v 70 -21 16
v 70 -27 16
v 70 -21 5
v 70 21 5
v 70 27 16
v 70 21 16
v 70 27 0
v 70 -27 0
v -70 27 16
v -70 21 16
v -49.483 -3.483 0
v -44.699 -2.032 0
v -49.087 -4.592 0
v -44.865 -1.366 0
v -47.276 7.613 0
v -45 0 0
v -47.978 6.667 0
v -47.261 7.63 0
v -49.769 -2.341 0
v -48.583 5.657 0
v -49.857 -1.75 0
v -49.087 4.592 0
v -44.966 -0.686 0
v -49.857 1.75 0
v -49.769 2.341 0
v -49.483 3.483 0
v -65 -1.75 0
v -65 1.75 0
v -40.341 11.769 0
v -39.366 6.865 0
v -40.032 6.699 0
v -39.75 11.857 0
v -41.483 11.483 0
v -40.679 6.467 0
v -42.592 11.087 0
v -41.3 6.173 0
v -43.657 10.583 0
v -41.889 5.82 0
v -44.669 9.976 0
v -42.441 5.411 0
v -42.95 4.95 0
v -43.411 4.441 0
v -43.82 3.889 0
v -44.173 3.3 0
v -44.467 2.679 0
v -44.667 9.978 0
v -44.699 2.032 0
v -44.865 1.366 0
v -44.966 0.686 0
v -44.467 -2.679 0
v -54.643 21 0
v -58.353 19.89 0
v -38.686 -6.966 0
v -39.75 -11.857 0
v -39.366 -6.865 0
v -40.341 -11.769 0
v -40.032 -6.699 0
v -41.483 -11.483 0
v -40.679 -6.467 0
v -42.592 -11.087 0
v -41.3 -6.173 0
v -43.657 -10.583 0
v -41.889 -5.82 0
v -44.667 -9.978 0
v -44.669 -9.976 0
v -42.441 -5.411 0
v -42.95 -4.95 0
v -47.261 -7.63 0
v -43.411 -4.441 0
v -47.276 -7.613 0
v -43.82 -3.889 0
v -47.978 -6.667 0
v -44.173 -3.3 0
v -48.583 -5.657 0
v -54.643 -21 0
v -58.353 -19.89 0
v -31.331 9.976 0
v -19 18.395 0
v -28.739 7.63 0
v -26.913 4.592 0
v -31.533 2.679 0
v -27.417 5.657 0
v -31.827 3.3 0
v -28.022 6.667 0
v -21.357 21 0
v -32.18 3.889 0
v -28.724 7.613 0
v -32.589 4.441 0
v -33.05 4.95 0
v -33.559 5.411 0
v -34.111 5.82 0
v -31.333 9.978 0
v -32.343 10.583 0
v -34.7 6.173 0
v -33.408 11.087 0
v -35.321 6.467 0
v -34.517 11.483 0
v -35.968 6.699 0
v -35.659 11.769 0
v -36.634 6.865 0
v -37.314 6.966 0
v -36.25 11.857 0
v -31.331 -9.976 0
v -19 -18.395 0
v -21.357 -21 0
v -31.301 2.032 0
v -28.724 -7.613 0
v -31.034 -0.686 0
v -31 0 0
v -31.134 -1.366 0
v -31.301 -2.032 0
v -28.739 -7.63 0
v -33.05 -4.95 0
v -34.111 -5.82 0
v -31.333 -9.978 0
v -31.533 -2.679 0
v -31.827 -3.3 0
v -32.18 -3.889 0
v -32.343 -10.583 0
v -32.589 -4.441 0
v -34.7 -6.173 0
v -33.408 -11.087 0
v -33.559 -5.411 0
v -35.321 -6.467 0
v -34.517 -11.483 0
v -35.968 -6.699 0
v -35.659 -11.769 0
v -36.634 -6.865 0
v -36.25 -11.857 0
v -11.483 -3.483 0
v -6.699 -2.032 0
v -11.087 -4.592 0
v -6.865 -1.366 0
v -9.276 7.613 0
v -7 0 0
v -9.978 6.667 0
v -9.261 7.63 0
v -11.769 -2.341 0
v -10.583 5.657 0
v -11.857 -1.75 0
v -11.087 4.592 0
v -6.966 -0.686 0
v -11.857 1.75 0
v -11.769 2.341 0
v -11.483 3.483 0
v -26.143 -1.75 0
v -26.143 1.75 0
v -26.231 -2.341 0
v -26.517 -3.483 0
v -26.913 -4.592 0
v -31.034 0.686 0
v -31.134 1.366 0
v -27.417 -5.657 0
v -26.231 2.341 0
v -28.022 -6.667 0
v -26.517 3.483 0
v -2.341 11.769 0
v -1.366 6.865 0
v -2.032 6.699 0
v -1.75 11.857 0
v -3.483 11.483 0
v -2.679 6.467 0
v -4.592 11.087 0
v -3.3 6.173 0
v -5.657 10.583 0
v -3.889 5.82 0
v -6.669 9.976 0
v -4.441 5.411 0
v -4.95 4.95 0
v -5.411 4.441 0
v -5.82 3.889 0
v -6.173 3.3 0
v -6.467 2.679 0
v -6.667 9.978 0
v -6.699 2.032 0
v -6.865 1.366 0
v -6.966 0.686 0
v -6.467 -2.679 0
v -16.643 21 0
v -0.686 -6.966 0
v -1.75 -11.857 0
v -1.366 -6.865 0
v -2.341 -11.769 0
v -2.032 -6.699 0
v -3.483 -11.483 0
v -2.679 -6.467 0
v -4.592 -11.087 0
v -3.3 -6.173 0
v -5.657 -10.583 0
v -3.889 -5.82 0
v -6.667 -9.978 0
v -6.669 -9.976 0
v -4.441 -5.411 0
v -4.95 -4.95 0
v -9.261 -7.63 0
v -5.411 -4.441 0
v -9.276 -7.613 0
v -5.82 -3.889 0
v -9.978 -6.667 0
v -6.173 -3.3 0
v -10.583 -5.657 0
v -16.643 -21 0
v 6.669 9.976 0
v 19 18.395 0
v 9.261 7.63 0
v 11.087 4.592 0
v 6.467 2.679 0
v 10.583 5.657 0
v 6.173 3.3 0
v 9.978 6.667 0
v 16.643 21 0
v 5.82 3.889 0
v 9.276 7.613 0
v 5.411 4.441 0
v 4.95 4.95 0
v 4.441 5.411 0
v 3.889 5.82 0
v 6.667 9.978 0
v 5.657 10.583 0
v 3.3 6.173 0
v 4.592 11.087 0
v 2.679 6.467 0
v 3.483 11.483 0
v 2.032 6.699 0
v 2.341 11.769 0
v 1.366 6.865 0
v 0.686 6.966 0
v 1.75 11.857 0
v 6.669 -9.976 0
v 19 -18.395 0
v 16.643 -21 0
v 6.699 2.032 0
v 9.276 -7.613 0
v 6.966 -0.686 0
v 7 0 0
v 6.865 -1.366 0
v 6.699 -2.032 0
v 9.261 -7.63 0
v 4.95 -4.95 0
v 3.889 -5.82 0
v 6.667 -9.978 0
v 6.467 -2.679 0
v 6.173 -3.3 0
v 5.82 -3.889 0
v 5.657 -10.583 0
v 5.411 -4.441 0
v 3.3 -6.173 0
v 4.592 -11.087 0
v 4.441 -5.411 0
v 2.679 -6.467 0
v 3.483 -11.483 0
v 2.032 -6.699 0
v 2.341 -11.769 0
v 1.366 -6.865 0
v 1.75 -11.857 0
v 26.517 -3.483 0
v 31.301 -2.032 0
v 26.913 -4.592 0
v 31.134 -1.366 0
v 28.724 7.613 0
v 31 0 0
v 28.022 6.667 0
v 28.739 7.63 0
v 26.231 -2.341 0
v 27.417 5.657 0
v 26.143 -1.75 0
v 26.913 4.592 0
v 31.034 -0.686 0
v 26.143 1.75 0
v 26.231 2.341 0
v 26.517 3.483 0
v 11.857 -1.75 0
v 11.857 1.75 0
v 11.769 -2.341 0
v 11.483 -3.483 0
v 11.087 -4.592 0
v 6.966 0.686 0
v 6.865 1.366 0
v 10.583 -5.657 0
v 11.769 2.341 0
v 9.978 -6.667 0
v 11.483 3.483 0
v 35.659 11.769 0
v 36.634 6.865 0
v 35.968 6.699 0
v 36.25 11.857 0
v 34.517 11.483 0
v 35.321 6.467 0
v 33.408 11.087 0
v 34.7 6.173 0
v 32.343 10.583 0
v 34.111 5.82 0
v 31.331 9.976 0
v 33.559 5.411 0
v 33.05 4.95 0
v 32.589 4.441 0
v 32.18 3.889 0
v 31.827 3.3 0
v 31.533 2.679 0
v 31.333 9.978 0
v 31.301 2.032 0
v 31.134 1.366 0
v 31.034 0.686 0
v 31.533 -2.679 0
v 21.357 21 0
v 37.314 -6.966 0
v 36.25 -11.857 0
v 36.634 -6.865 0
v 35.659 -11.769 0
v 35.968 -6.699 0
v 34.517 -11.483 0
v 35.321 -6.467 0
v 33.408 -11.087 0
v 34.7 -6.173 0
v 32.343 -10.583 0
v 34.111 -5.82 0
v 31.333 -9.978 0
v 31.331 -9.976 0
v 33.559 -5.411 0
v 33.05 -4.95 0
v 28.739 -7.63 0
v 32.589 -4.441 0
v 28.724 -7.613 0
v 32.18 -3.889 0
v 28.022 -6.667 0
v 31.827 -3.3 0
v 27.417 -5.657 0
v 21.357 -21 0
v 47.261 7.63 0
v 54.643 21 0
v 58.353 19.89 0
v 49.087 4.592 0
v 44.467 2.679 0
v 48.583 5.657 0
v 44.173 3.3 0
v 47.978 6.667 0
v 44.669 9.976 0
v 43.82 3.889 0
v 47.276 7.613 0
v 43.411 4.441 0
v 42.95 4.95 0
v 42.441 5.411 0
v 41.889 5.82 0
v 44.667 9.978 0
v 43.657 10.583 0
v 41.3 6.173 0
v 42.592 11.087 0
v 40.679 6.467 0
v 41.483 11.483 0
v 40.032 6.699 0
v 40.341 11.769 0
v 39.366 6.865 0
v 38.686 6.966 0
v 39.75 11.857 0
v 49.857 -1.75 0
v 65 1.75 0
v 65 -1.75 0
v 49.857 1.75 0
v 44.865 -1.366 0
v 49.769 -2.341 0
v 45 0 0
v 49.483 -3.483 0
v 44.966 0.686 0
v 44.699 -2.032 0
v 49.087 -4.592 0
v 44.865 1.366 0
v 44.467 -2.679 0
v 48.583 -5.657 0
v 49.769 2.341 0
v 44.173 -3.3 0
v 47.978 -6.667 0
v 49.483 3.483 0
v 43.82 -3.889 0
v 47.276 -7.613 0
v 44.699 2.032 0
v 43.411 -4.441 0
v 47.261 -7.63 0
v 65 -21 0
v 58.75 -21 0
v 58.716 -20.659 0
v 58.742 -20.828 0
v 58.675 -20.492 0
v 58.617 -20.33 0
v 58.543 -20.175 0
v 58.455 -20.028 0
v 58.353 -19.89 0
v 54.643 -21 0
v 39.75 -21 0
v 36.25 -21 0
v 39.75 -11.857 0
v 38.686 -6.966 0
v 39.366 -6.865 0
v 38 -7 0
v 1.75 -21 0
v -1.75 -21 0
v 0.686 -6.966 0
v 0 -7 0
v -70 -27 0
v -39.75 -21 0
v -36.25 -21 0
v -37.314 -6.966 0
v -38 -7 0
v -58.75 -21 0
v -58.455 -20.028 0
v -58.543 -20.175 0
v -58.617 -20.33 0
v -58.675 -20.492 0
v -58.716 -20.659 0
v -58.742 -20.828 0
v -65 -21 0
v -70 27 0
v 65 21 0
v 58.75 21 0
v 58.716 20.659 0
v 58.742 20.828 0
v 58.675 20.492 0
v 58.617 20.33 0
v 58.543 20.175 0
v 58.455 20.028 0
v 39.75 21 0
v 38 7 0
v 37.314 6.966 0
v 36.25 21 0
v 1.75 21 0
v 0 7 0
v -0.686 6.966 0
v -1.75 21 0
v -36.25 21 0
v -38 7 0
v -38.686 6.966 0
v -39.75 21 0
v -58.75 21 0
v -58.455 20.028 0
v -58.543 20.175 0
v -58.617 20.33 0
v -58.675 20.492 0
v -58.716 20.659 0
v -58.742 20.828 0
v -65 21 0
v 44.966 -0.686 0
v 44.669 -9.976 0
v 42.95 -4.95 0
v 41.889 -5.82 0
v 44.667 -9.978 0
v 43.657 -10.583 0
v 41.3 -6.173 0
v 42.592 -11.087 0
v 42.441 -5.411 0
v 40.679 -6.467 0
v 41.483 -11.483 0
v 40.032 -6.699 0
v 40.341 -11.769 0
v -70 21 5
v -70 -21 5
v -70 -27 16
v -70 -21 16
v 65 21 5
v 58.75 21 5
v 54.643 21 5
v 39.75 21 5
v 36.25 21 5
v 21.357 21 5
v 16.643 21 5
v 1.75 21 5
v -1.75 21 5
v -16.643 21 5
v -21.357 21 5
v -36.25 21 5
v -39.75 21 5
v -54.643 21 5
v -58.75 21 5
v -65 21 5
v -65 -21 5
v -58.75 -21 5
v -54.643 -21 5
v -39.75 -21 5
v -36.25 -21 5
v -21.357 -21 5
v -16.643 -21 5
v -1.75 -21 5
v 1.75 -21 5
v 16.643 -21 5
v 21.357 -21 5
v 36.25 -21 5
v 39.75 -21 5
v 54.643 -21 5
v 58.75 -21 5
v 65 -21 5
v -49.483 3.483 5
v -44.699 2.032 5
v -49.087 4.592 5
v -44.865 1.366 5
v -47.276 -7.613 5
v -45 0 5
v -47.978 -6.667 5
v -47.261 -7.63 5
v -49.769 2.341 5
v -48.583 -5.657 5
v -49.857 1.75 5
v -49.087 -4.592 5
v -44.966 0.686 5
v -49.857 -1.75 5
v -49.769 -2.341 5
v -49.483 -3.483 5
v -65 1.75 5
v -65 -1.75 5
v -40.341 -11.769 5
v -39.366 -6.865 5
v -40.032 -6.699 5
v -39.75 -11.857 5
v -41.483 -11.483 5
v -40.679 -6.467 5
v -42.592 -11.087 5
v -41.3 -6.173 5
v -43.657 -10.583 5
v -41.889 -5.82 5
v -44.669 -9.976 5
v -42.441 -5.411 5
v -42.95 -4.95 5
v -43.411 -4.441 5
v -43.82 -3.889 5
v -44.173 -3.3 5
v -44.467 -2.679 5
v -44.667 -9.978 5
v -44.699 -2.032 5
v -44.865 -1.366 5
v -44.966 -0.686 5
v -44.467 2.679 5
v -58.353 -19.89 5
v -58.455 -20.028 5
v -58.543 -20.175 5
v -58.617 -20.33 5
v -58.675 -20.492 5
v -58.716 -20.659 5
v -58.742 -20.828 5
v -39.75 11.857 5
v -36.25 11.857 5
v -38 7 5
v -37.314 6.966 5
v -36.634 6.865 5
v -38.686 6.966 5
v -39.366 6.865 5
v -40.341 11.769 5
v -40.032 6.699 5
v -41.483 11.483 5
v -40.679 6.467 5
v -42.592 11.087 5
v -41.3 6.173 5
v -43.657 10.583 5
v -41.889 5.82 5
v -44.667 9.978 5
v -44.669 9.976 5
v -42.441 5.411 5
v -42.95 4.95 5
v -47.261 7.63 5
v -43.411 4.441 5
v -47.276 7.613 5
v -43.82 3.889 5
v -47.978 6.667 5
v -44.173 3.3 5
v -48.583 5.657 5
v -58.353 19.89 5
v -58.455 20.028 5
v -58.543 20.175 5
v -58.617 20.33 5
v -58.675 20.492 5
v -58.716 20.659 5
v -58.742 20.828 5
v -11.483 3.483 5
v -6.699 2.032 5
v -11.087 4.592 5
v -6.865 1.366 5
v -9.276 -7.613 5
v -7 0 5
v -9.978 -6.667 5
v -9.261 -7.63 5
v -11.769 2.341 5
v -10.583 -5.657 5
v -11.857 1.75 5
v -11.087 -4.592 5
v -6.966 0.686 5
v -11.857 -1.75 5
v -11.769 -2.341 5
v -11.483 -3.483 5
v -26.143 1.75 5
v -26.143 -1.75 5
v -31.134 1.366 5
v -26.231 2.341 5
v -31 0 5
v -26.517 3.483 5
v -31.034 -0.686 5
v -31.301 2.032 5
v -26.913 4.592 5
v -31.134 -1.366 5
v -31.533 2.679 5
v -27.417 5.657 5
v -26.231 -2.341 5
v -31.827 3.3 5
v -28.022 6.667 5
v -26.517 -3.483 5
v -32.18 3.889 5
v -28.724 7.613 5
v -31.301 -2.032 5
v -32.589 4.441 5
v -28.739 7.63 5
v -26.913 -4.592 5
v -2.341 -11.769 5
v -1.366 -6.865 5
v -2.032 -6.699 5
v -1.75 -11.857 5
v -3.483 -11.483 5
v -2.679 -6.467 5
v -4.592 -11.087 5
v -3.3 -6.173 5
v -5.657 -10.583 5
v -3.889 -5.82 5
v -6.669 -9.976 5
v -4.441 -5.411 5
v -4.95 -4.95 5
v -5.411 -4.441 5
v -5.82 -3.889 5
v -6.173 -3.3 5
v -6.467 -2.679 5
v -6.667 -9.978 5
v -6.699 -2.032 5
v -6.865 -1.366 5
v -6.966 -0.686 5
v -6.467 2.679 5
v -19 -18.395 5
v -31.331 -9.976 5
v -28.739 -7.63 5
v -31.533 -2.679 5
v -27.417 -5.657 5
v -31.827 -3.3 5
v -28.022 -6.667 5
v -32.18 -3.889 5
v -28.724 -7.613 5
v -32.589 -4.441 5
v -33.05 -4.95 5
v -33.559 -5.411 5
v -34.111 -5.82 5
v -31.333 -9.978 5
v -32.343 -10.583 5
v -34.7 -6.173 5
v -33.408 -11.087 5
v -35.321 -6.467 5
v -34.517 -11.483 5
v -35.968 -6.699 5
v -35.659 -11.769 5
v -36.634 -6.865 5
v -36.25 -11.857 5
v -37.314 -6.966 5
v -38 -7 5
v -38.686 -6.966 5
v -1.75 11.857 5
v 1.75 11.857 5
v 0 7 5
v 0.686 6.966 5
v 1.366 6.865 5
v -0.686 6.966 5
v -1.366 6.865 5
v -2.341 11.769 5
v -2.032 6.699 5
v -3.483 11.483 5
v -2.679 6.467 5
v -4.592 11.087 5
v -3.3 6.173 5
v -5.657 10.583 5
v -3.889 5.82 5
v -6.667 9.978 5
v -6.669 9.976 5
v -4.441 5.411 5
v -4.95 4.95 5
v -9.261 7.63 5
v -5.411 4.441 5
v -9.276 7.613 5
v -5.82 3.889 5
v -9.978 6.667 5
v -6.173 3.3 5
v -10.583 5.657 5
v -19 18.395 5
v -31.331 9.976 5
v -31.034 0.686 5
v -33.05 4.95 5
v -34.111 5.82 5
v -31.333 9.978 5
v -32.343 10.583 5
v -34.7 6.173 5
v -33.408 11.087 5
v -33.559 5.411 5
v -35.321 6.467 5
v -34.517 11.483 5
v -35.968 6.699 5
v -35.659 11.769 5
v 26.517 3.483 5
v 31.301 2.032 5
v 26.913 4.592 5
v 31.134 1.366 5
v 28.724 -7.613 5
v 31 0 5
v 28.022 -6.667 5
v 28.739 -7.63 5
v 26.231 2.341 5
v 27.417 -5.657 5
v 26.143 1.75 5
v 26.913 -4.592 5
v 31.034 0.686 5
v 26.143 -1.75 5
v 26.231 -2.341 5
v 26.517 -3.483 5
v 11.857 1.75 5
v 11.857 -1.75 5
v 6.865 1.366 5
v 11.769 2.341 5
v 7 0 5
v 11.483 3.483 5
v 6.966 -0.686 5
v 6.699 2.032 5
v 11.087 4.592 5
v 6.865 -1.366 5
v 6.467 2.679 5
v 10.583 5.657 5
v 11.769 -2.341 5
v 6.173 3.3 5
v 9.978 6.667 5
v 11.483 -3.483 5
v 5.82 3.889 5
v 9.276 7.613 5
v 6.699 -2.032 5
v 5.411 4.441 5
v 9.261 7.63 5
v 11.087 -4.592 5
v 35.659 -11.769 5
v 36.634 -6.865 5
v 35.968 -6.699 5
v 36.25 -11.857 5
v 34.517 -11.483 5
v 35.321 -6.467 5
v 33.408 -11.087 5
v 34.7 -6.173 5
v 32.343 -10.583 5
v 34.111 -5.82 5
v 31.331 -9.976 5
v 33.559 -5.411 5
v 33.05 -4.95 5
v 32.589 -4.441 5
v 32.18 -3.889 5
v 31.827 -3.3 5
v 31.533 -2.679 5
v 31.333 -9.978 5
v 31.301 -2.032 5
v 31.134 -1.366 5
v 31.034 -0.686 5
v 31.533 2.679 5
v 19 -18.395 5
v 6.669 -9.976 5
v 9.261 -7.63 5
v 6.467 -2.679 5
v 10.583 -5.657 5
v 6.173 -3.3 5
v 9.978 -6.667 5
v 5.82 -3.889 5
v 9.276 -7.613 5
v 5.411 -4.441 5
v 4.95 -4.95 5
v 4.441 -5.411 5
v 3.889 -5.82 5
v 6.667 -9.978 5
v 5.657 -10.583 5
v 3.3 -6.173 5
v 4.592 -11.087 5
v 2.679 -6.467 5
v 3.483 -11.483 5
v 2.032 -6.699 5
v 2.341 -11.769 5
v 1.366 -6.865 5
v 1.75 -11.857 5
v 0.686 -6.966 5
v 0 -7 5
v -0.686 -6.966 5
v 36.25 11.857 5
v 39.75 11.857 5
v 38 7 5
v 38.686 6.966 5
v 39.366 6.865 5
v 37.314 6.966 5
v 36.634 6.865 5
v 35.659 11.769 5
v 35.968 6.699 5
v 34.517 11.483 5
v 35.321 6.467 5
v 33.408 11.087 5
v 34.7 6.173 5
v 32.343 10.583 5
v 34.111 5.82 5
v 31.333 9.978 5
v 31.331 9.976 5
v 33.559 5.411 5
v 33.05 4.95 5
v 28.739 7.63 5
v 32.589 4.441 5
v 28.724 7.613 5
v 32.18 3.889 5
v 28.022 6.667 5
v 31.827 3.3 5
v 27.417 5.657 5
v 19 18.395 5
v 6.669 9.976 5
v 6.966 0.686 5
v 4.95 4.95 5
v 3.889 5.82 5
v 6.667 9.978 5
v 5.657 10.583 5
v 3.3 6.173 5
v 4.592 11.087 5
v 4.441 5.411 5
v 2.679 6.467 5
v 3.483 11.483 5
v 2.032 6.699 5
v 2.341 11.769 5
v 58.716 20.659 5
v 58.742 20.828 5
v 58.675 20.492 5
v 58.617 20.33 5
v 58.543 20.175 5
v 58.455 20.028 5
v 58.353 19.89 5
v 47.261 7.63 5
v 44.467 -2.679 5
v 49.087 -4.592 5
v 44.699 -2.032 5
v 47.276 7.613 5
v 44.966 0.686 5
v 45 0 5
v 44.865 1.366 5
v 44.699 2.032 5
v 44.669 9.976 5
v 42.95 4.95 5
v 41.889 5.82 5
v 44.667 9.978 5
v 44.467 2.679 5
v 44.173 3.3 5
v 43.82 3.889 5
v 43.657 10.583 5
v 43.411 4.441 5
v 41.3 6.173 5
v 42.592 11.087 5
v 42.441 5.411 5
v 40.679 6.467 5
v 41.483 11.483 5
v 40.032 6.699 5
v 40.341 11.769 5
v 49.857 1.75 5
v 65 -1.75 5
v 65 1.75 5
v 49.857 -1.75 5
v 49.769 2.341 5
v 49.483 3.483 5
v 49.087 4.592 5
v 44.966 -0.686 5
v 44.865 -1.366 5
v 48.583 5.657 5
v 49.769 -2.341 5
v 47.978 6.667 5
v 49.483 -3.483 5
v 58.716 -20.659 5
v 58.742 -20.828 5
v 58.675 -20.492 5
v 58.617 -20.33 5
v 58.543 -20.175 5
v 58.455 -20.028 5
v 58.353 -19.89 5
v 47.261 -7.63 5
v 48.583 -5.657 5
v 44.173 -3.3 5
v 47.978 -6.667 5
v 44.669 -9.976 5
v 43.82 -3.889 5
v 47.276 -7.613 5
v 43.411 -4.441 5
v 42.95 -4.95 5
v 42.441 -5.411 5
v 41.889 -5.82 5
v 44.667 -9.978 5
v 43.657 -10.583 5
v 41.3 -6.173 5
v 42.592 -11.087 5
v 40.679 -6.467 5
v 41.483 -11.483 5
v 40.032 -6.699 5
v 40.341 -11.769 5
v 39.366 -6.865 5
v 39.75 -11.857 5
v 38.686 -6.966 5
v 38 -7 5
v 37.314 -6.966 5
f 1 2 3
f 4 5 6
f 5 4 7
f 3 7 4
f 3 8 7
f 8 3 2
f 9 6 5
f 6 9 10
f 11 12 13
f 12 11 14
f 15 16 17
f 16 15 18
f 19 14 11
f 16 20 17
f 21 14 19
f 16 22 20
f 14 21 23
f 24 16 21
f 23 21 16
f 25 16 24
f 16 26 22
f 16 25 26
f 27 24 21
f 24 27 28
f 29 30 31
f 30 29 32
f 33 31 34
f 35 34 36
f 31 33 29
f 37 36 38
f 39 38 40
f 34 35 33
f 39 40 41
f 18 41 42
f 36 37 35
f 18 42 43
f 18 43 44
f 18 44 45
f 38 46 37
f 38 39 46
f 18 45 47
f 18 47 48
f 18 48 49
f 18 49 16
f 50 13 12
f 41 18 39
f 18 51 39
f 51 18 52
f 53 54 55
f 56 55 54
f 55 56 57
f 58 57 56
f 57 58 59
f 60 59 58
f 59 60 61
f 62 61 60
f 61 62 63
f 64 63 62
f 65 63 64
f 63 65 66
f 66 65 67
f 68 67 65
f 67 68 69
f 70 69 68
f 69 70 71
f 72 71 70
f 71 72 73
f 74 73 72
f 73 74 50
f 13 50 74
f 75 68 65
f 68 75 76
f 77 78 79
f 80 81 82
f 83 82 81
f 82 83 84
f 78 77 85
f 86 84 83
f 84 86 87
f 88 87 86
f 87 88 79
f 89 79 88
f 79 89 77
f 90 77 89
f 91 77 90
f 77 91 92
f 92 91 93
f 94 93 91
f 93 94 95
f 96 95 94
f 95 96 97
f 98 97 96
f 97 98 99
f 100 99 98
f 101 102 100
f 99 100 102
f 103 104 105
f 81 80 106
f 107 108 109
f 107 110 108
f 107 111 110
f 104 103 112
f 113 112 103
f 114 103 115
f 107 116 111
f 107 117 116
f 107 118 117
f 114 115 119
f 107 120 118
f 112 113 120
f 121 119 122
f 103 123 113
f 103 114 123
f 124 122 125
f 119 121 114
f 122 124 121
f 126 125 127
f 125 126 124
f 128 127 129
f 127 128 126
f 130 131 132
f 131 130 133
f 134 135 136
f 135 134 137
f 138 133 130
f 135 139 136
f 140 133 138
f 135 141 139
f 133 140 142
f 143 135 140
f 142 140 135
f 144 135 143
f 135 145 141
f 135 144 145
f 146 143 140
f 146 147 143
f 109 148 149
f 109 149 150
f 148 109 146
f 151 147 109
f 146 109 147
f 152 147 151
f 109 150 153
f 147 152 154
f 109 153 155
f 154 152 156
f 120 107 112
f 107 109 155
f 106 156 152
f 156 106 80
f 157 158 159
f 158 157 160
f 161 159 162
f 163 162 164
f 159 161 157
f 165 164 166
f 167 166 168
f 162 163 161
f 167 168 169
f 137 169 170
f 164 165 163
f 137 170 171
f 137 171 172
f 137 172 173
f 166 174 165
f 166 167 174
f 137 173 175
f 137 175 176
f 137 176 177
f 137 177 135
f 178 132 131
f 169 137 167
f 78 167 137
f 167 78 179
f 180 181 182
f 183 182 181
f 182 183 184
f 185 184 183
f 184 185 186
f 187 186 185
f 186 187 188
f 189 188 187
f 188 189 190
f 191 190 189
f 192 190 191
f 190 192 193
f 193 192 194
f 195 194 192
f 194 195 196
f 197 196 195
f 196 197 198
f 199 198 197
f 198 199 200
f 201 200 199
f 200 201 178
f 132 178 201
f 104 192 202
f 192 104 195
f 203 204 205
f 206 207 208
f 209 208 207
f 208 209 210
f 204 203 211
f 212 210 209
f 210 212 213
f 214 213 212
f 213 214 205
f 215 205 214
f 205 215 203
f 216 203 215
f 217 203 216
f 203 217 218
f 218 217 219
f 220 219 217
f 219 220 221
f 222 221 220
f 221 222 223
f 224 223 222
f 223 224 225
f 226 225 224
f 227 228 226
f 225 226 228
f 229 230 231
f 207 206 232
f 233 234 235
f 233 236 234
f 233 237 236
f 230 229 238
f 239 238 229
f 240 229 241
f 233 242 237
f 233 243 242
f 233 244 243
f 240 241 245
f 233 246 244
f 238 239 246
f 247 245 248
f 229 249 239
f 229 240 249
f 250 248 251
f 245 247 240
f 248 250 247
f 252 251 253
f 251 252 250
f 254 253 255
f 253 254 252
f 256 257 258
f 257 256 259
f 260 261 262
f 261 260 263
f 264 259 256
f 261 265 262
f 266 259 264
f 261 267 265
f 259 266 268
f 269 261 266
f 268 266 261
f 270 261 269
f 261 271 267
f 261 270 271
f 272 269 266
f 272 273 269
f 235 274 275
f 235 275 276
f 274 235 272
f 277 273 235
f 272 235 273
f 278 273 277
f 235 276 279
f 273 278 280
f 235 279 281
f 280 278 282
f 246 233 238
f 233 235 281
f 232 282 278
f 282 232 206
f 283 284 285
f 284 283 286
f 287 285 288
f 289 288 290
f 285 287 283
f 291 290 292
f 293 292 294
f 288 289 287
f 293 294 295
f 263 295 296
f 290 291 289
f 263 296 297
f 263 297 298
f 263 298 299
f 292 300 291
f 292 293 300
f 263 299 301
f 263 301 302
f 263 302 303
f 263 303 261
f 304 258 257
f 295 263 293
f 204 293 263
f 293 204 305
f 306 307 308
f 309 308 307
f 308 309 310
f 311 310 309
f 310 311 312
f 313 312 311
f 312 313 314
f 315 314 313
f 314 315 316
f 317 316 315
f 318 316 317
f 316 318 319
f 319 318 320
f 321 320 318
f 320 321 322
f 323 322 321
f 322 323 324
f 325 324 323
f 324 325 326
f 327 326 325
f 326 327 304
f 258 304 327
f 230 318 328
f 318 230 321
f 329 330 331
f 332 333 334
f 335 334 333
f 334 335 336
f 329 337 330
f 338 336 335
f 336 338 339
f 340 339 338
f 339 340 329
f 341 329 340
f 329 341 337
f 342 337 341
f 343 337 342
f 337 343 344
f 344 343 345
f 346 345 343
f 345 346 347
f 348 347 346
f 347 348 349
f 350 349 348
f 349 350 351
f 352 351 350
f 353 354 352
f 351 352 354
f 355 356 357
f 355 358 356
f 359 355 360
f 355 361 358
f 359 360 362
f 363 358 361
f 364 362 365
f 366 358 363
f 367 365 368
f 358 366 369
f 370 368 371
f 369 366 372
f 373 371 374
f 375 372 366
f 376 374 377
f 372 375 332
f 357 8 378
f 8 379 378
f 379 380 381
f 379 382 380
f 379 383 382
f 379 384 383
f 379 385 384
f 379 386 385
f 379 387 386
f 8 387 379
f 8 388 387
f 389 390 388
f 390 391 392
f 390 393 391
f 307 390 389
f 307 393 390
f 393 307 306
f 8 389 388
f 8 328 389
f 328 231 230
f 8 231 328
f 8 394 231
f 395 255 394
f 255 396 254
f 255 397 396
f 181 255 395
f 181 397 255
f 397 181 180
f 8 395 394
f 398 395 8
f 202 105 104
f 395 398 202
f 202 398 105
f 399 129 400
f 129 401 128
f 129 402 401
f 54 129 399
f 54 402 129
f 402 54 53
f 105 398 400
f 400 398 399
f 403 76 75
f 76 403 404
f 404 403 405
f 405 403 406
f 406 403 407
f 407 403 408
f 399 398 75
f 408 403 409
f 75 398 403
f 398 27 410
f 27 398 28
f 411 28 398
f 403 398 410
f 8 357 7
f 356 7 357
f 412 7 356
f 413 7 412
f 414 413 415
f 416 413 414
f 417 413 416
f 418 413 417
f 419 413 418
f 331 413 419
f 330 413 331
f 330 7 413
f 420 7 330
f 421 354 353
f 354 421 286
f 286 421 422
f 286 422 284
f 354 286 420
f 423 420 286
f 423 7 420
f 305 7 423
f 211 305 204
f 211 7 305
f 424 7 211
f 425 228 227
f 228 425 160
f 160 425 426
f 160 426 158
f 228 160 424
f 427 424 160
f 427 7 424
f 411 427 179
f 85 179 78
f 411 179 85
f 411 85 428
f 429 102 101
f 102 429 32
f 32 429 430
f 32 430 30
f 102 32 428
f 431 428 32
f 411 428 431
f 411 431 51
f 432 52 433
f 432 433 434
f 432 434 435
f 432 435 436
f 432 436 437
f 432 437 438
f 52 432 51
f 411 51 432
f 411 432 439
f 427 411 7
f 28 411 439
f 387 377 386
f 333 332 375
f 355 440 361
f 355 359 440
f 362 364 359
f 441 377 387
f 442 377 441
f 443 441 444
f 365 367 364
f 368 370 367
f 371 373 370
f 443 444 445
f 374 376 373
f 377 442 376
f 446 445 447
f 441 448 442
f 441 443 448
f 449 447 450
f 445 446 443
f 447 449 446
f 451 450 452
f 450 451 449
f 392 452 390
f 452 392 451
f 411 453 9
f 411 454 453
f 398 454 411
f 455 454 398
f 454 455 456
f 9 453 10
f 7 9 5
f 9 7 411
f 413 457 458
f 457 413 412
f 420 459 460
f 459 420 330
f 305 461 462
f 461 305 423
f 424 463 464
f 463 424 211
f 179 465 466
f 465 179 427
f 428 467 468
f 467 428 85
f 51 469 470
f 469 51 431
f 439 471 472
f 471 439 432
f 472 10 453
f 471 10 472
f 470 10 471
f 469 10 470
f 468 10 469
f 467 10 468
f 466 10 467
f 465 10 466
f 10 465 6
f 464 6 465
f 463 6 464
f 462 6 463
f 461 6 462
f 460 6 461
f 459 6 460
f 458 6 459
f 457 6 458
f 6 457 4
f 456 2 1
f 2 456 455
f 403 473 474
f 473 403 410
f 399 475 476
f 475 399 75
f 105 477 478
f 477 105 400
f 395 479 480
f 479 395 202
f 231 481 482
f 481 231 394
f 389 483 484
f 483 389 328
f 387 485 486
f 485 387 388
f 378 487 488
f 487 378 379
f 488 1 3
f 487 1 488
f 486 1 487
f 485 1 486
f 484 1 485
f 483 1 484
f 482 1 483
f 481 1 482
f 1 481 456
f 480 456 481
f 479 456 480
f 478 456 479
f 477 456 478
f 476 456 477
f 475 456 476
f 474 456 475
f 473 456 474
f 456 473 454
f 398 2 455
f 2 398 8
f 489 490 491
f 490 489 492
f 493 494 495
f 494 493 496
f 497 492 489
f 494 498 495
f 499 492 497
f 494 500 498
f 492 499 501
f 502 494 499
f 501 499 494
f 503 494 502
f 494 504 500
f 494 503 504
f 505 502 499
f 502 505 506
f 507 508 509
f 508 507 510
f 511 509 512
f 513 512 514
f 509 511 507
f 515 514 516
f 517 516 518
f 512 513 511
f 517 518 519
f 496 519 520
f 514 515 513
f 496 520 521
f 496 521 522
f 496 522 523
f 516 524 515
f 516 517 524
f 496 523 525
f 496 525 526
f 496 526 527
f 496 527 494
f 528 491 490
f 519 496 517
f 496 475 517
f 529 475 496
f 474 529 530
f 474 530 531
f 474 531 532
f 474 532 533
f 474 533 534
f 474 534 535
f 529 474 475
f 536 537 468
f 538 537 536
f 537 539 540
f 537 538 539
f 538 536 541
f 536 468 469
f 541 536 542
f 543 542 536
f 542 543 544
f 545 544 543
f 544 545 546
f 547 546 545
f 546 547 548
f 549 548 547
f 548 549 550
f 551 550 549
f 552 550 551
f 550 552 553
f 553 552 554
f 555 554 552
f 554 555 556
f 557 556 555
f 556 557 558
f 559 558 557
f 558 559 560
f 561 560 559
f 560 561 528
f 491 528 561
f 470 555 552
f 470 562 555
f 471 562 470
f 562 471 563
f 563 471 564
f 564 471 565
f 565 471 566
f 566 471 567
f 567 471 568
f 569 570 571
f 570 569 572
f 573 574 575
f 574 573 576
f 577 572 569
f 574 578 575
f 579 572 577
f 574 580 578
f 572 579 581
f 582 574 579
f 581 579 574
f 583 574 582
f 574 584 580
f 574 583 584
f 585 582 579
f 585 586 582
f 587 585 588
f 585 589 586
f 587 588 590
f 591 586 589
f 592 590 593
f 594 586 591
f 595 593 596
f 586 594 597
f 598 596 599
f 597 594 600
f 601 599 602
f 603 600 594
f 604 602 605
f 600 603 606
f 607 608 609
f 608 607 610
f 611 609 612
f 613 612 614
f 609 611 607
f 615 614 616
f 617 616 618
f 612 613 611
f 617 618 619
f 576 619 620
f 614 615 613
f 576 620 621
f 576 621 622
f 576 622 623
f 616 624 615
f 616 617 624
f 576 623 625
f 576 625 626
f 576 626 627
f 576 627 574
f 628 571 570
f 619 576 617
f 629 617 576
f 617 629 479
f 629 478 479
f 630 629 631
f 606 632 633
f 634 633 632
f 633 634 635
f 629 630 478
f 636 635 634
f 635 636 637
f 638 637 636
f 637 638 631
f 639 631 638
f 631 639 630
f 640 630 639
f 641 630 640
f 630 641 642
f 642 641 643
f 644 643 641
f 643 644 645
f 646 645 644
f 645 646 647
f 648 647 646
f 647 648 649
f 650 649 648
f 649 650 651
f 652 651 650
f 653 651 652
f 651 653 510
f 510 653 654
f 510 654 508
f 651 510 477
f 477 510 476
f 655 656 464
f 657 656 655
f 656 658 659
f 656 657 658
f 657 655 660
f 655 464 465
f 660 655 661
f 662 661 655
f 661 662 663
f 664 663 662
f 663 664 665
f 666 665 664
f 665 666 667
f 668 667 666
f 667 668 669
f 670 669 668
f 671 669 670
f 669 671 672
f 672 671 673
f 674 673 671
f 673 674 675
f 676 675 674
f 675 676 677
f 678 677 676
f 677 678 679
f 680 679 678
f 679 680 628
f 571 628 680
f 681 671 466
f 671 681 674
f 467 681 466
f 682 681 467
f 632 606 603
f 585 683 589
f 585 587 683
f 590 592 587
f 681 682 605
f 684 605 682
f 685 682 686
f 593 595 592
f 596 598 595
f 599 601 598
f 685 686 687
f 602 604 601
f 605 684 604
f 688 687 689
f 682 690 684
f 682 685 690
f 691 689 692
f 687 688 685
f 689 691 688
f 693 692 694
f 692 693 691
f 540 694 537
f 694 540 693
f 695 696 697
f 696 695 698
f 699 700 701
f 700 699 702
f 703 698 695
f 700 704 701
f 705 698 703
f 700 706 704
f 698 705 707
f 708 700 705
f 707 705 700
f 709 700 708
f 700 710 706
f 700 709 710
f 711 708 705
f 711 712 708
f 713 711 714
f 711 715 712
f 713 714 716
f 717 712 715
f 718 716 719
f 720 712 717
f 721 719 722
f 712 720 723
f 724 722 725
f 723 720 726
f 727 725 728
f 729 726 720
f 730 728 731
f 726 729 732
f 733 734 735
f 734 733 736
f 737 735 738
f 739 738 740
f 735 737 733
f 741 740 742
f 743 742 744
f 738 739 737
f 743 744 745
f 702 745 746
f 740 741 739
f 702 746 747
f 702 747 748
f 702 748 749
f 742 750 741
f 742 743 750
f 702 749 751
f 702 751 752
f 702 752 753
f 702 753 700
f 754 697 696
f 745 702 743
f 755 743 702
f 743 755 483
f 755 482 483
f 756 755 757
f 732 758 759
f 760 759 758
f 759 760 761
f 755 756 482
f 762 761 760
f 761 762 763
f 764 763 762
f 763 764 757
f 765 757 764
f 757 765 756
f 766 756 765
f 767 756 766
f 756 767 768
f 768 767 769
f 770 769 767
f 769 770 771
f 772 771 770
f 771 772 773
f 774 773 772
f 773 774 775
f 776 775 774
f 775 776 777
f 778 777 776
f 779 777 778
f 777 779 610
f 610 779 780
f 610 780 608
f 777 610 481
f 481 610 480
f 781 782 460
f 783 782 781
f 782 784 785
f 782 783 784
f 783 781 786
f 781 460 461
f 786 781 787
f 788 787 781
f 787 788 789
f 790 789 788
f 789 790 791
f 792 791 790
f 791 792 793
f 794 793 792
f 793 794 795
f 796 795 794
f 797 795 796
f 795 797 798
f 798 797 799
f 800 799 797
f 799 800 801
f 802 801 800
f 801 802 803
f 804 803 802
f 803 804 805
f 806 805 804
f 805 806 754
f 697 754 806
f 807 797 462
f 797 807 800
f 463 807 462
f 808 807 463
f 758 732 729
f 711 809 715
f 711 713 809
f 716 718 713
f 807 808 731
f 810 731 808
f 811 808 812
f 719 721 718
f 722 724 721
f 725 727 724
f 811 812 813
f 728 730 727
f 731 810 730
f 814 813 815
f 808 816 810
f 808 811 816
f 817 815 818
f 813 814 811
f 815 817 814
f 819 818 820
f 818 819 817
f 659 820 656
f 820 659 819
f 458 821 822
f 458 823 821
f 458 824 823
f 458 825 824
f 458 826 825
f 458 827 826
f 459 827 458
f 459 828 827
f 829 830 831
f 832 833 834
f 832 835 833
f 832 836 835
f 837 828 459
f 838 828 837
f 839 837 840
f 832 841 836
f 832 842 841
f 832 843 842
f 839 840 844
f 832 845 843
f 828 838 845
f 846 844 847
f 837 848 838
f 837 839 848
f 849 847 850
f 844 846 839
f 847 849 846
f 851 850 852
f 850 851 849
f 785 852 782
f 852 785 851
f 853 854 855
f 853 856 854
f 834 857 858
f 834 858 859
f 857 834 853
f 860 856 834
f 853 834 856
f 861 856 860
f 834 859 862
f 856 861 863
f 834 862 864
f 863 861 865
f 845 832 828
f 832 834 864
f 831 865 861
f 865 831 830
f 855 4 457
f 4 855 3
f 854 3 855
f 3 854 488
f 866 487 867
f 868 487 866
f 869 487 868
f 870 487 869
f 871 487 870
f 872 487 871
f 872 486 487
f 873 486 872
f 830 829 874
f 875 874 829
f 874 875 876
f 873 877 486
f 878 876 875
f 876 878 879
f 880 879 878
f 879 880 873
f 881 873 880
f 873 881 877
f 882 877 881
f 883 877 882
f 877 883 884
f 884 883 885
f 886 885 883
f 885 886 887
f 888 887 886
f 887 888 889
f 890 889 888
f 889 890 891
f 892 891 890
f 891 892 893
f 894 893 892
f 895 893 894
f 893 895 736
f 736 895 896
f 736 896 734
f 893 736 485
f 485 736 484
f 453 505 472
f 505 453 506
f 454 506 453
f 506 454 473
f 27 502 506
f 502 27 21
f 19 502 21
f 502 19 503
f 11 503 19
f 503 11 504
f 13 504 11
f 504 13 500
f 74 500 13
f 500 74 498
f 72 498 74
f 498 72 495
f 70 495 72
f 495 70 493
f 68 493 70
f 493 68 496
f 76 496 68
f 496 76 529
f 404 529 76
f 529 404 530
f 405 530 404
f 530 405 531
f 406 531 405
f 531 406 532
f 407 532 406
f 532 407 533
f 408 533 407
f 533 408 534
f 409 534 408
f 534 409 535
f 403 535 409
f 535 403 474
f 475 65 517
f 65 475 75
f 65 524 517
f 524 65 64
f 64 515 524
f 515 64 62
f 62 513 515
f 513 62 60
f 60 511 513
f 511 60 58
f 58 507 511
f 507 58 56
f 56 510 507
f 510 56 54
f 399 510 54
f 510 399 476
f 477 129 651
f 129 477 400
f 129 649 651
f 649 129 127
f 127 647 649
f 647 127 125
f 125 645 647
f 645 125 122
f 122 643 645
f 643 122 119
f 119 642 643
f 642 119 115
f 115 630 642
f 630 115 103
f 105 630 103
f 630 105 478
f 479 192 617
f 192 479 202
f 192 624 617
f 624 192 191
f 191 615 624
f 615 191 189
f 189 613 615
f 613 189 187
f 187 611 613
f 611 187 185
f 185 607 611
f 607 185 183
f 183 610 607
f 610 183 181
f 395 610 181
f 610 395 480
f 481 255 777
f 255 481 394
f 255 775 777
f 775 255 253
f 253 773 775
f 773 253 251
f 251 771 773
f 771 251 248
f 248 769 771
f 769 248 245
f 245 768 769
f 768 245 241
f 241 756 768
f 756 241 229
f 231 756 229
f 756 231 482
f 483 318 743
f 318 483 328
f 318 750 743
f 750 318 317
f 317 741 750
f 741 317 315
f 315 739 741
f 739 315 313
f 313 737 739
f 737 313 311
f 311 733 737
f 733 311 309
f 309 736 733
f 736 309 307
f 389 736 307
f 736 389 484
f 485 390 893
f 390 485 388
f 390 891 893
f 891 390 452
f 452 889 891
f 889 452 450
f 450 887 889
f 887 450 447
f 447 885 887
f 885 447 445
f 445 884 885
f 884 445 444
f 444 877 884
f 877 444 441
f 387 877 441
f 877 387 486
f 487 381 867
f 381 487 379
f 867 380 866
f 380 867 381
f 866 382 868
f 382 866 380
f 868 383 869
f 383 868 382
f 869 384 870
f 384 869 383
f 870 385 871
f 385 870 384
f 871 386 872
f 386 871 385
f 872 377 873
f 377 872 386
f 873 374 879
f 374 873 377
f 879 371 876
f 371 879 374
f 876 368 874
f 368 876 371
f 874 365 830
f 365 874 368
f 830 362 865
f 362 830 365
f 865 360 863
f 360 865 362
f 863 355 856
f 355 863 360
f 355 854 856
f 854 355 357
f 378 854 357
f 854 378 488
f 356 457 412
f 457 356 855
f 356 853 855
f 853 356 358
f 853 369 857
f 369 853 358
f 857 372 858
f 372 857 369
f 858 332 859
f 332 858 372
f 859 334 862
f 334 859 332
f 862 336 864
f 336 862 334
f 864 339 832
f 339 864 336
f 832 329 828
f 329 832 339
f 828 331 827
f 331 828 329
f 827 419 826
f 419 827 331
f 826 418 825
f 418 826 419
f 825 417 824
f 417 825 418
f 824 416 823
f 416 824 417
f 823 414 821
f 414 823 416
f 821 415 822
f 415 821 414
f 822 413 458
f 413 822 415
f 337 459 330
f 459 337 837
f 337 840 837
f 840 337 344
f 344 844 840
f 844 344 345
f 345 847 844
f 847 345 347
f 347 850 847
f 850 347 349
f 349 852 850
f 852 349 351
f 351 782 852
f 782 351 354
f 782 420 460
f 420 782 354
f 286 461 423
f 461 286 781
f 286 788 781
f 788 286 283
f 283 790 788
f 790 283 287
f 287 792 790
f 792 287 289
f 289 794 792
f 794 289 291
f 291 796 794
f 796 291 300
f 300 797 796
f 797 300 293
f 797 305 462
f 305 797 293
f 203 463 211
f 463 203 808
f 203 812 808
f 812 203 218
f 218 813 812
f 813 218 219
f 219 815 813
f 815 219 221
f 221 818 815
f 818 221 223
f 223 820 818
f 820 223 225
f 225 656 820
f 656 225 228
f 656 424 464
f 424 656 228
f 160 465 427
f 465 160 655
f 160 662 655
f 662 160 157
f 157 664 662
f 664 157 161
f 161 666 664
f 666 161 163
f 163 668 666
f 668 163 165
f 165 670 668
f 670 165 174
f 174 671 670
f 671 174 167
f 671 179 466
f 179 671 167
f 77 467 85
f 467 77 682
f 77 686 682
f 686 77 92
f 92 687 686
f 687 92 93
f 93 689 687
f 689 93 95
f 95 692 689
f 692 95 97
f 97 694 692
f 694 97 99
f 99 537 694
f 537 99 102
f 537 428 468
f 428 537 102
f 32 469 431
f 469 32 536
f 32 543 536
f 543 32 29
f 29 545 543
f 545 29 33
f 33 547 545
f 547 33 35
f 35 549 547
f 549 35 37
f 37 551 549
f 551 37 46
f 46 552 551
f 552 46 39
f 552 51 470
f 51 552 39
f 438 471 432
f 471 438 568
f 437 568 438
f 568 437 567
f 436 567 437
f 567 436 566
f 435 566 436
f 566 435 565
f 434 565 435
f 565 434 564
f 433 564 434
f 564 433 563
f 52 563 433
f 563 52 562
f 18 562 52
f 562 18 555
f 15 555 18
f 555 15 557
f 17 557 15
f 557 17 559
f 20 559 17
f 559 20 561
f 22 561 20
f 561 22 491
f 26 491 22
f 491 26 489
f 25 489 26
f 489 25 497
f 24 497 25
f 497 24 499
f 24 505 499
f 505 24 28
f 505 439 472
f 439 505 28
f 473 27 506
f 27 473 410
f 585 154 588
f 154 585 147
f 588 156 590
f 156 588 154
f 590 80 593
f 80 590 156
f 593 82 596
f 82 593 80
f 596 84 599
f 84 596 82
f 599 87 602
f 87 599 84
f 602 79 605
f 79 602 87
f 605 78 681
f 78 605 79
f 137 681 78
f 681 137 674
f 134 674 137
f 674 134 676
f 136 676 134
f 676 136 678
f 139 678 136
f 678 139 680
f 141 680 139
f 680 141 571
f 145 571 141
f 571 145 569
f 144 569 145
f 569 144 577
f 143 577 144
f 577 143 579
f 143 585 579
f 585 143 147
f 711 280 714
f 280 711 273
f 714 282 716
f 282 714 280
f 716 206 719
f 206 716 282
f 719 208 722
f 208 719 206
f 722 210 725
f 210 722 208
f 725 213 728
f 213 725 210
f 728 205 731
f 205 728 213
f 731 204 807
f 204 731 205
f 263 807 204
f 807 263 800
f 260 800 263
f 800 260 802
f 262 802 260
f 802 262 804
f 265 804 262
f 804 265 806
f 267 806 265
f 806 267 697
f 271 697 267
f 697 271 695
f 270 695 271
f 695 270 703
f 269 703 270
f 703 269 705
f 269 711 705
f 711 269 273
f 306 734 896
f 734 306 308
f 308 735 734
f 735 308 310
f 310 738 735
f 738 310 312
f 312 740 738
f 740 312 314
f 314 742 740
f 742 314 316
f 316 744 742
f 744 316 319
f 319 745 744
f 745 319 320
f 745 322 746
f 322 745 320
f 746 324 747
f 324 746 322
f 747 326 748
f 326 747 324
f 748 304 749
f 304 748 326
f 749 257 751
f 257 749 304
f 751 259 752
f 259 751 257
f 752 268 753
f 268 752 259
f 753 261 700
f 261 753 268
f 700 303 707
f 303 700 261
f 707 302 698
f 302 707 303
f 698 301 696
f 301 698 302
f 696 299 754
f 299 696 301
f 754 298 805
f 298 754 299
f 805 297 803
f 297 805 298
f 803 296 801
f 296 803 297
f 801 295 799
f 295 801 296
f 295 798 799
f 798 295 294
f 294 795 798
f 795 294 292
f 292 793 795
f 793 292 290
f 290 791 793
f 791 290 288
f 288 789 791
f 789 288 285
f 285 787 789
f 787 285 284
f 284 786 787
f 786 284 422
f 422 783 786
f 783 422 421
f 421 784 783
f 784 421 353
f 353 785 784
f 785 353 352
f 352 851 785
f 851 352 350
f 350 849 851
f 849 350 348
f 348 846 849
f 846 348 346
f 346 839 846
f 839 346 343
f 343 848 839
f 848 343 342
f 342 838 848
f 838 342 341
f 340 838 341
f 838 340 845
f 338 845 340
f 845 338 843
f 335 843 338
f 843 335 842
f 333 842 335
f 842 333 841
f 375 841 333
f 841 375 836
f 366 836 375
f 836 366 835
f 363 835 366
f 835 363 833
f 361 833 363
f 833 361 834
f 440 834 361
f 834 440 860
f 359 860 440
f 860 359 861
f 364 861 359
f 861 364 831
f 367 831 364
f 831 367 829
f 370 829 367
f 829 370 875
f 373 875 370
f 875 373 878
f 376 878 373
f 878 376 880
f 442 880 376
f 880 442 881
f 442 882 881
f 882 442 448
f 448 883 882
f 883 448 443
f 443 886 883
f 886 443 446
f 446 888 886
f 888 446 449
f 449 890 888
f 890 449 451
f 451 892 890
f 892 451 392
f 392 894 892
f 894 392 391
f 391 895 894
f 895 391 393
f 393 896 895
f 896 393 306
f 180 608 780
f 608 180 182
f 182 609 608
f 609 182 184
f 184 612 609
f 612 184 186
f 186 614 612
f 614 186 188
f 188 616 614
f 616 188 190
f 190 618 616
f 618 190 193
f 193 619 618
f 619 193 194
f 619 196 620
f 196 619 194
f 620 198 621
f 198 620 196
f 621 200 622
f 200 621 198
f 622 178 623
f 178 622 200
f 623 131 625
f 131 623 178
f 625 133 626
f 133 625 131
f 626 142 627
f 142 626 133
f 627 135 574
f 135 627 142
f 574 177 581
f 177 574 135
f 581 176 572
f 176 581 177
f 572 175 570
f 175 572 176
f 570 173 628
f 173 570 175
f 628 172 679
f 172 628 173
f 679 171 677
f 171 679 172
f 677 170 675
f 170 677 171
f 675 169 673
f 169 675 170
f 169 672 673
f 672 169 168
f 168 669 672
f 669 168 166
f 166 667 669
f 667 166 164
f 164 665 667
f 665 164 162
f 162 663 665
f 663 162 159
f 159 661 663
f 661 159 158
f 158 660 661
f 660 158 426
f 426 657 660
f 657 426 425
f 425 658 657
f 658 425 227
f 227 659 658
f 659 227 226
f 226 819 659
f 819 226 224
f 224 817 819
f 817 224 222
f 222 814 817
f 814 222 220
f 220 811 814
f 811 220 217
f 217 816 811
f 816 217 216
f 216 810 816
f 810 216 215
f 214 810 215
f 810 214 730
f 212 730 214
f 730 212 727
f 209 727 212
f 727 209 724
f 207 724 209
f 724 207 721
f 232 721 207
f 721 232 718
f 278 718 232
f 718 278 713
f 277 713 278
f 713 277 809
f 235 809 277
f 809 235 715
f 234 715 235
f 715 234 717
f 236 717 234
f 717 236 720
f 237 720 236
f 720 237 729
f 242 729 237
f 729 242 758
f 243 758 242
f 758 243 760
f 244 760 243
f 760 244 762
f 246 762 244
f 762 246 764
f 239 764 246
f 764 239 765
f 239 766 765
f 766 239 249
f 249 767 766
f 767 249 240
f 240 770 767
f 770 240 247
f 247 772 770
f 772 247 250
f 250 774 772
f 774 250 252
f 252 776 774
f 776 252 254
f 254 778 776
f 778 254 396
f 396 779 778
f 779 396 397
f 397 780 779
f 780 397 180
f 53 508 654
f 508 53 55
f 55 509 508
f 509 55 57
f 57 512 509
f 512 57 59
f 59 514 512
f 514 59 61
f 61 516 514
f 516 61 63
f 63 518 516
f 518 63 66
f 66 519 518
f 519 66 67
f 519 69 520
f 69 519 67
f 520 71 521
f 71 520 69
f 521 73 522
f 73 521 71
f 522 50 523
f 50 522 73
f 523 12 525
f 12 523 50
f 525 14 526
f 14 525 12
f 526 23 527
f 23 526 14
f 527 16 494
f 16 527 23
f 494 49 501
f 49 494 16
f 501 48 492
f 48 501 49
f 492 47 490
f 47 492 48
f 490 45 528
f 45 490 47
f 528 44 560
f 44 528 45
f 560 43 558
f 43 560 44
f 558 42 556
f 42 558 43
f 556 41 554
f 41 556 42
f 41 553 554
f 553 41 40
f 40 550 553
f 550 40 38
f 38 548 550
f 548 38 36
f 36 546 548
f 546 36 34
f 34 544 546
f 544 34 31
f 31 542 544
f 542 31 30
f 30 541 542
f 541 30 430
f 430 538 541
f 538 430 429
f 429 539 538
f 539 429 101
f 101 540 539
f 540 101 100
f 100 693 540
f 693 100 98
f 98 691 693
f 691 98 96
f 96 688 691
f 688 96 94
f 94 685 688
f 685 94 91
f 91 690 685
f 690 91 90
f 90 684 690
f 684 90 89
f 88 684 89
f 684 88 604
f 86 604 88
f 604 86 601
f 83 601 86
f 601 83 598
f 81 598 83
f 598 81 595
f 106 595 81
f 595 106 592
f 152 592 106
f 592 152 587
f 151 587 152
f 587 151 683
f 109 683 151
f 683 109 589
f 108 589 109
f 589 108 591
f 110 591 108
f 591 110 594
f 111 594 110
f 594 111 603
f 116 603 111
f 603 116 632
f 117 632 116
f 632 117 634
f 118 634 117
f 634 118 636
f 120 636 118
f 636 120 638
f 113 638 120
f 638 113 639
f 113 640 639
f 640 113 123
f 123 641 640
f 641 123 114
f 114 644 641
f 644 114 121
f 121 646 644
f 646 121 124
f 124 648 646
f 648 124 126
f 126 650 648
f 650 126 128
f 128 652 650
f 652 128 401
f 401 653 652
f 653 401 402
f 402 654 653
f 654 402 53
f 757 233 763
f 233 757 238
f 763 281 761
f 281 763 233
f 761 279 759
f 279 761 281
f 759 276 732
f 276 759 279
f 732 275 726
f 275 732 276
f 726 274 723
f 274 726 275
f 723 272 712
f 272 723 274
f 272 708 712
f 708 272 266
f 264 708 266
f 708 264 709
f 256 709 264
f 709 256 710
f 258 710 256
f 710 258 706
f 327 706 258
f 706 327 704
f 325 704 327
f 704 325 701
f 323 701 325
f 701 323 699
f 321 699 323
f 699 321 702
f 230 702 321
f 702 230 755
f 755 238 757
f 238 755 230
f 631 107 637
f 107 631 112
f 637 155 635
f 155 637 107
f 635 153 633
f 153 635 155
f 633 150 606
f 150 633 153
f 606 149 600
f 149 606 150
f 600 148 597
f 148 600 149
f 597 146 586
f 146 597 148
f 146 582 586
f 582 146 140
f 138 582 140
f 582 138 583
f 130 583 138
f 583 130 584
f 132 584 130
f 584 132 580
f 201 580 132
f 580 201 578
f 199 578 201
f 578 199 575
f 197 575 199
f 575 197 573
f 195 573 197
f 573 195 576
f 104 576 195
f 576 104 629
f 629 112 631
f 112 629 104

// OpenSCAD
// Parameters
length = 140;             // Overall part length
width = 54;               // Overall part width
web_height = 5;           // Height/thickness of the thin open web
wall_height = 16;         // Total height of the raised side walls
wall_thickness = 6;       // Thickness of the two long side walls
end_rib_thickness = 5;    // Thickness of perimeter ribs at short ends
rib_thickness = 3.5;      // Thickness of internal structural ribs
hole_diameter = 14;       // Diameter of circular through-hole openings
boss_diameter = 24;       // Outer diameter of circular hubs
pitch = 38;               // Spacing between circular hubs
$fn = 64;                 // Arc resolution

inner_width = width - 2 * wall_thickness;
hole_positions = [-pitch, 0, pitch];

// 2D Profile of Open Web Structure
module web_profile() {
    difference() {
        intersection() {
            square([length, inner_width], center = true);
            union() {
                // Short-end perimeter ribs
                translate([-length / 2 + end_rib_thickness / 2, 0])
                    square([end_rib_thickness, inner_width], center = true);
                translate([length / 2 - end_rib_thickness / 2, 0])
                    square([end_rib_thickness, inner_width], center = true);

                // Longitudinal center rib
                square([length, rib_thickness], center = true);

                // Hub bosses and cross ribs
                for (x = hole_positions) {
                    translate([x, 0])
                        circle(d = boss_diameter);
                    translate([x, 0])
                        square([rib_thickness, inner_width], center = true);
                }

                // Internal diagonal truss ribs
                for (x = hole_positions) {
                    for (sy = [-1, 1]) {
                        hull() {
                            translate([x, 0])
                                circle(d = rib_thickness);
                            translate([x - pitch / 2, sy * inner_width / 2])
                                circle(d = rib_thickness);
                        }
                        hull() {
                            translate([x, 0])
                                circle(d = rib_thickness);
                            translate([x + pitch / 2, sy * inner_width / 2])
                                circle(d = rib_thickness);
                        }
                    }
                }
            }
        }

        // Circular voids passing through the hubs
        for (x = hole_positions) {
            translate([x, 0])
                circle(d = hole_diameter);
        }
    }
}

// Raised Solid Side Walls
module side_walls() {
    translate([0, (width - wall_thickness) / 2, wall_height / 2])
        cube([length, wall_thickness, wall_height], center = true);
    translate([0, -(width - wall_thickness) / 2, wall_height / 2])
        cube([length, wall_thickness, wall_height], center = true);
}

// Complete Assembly
union() {
    side_walls();
    linear_extrude(height = web_height)
        web_profile();
}
